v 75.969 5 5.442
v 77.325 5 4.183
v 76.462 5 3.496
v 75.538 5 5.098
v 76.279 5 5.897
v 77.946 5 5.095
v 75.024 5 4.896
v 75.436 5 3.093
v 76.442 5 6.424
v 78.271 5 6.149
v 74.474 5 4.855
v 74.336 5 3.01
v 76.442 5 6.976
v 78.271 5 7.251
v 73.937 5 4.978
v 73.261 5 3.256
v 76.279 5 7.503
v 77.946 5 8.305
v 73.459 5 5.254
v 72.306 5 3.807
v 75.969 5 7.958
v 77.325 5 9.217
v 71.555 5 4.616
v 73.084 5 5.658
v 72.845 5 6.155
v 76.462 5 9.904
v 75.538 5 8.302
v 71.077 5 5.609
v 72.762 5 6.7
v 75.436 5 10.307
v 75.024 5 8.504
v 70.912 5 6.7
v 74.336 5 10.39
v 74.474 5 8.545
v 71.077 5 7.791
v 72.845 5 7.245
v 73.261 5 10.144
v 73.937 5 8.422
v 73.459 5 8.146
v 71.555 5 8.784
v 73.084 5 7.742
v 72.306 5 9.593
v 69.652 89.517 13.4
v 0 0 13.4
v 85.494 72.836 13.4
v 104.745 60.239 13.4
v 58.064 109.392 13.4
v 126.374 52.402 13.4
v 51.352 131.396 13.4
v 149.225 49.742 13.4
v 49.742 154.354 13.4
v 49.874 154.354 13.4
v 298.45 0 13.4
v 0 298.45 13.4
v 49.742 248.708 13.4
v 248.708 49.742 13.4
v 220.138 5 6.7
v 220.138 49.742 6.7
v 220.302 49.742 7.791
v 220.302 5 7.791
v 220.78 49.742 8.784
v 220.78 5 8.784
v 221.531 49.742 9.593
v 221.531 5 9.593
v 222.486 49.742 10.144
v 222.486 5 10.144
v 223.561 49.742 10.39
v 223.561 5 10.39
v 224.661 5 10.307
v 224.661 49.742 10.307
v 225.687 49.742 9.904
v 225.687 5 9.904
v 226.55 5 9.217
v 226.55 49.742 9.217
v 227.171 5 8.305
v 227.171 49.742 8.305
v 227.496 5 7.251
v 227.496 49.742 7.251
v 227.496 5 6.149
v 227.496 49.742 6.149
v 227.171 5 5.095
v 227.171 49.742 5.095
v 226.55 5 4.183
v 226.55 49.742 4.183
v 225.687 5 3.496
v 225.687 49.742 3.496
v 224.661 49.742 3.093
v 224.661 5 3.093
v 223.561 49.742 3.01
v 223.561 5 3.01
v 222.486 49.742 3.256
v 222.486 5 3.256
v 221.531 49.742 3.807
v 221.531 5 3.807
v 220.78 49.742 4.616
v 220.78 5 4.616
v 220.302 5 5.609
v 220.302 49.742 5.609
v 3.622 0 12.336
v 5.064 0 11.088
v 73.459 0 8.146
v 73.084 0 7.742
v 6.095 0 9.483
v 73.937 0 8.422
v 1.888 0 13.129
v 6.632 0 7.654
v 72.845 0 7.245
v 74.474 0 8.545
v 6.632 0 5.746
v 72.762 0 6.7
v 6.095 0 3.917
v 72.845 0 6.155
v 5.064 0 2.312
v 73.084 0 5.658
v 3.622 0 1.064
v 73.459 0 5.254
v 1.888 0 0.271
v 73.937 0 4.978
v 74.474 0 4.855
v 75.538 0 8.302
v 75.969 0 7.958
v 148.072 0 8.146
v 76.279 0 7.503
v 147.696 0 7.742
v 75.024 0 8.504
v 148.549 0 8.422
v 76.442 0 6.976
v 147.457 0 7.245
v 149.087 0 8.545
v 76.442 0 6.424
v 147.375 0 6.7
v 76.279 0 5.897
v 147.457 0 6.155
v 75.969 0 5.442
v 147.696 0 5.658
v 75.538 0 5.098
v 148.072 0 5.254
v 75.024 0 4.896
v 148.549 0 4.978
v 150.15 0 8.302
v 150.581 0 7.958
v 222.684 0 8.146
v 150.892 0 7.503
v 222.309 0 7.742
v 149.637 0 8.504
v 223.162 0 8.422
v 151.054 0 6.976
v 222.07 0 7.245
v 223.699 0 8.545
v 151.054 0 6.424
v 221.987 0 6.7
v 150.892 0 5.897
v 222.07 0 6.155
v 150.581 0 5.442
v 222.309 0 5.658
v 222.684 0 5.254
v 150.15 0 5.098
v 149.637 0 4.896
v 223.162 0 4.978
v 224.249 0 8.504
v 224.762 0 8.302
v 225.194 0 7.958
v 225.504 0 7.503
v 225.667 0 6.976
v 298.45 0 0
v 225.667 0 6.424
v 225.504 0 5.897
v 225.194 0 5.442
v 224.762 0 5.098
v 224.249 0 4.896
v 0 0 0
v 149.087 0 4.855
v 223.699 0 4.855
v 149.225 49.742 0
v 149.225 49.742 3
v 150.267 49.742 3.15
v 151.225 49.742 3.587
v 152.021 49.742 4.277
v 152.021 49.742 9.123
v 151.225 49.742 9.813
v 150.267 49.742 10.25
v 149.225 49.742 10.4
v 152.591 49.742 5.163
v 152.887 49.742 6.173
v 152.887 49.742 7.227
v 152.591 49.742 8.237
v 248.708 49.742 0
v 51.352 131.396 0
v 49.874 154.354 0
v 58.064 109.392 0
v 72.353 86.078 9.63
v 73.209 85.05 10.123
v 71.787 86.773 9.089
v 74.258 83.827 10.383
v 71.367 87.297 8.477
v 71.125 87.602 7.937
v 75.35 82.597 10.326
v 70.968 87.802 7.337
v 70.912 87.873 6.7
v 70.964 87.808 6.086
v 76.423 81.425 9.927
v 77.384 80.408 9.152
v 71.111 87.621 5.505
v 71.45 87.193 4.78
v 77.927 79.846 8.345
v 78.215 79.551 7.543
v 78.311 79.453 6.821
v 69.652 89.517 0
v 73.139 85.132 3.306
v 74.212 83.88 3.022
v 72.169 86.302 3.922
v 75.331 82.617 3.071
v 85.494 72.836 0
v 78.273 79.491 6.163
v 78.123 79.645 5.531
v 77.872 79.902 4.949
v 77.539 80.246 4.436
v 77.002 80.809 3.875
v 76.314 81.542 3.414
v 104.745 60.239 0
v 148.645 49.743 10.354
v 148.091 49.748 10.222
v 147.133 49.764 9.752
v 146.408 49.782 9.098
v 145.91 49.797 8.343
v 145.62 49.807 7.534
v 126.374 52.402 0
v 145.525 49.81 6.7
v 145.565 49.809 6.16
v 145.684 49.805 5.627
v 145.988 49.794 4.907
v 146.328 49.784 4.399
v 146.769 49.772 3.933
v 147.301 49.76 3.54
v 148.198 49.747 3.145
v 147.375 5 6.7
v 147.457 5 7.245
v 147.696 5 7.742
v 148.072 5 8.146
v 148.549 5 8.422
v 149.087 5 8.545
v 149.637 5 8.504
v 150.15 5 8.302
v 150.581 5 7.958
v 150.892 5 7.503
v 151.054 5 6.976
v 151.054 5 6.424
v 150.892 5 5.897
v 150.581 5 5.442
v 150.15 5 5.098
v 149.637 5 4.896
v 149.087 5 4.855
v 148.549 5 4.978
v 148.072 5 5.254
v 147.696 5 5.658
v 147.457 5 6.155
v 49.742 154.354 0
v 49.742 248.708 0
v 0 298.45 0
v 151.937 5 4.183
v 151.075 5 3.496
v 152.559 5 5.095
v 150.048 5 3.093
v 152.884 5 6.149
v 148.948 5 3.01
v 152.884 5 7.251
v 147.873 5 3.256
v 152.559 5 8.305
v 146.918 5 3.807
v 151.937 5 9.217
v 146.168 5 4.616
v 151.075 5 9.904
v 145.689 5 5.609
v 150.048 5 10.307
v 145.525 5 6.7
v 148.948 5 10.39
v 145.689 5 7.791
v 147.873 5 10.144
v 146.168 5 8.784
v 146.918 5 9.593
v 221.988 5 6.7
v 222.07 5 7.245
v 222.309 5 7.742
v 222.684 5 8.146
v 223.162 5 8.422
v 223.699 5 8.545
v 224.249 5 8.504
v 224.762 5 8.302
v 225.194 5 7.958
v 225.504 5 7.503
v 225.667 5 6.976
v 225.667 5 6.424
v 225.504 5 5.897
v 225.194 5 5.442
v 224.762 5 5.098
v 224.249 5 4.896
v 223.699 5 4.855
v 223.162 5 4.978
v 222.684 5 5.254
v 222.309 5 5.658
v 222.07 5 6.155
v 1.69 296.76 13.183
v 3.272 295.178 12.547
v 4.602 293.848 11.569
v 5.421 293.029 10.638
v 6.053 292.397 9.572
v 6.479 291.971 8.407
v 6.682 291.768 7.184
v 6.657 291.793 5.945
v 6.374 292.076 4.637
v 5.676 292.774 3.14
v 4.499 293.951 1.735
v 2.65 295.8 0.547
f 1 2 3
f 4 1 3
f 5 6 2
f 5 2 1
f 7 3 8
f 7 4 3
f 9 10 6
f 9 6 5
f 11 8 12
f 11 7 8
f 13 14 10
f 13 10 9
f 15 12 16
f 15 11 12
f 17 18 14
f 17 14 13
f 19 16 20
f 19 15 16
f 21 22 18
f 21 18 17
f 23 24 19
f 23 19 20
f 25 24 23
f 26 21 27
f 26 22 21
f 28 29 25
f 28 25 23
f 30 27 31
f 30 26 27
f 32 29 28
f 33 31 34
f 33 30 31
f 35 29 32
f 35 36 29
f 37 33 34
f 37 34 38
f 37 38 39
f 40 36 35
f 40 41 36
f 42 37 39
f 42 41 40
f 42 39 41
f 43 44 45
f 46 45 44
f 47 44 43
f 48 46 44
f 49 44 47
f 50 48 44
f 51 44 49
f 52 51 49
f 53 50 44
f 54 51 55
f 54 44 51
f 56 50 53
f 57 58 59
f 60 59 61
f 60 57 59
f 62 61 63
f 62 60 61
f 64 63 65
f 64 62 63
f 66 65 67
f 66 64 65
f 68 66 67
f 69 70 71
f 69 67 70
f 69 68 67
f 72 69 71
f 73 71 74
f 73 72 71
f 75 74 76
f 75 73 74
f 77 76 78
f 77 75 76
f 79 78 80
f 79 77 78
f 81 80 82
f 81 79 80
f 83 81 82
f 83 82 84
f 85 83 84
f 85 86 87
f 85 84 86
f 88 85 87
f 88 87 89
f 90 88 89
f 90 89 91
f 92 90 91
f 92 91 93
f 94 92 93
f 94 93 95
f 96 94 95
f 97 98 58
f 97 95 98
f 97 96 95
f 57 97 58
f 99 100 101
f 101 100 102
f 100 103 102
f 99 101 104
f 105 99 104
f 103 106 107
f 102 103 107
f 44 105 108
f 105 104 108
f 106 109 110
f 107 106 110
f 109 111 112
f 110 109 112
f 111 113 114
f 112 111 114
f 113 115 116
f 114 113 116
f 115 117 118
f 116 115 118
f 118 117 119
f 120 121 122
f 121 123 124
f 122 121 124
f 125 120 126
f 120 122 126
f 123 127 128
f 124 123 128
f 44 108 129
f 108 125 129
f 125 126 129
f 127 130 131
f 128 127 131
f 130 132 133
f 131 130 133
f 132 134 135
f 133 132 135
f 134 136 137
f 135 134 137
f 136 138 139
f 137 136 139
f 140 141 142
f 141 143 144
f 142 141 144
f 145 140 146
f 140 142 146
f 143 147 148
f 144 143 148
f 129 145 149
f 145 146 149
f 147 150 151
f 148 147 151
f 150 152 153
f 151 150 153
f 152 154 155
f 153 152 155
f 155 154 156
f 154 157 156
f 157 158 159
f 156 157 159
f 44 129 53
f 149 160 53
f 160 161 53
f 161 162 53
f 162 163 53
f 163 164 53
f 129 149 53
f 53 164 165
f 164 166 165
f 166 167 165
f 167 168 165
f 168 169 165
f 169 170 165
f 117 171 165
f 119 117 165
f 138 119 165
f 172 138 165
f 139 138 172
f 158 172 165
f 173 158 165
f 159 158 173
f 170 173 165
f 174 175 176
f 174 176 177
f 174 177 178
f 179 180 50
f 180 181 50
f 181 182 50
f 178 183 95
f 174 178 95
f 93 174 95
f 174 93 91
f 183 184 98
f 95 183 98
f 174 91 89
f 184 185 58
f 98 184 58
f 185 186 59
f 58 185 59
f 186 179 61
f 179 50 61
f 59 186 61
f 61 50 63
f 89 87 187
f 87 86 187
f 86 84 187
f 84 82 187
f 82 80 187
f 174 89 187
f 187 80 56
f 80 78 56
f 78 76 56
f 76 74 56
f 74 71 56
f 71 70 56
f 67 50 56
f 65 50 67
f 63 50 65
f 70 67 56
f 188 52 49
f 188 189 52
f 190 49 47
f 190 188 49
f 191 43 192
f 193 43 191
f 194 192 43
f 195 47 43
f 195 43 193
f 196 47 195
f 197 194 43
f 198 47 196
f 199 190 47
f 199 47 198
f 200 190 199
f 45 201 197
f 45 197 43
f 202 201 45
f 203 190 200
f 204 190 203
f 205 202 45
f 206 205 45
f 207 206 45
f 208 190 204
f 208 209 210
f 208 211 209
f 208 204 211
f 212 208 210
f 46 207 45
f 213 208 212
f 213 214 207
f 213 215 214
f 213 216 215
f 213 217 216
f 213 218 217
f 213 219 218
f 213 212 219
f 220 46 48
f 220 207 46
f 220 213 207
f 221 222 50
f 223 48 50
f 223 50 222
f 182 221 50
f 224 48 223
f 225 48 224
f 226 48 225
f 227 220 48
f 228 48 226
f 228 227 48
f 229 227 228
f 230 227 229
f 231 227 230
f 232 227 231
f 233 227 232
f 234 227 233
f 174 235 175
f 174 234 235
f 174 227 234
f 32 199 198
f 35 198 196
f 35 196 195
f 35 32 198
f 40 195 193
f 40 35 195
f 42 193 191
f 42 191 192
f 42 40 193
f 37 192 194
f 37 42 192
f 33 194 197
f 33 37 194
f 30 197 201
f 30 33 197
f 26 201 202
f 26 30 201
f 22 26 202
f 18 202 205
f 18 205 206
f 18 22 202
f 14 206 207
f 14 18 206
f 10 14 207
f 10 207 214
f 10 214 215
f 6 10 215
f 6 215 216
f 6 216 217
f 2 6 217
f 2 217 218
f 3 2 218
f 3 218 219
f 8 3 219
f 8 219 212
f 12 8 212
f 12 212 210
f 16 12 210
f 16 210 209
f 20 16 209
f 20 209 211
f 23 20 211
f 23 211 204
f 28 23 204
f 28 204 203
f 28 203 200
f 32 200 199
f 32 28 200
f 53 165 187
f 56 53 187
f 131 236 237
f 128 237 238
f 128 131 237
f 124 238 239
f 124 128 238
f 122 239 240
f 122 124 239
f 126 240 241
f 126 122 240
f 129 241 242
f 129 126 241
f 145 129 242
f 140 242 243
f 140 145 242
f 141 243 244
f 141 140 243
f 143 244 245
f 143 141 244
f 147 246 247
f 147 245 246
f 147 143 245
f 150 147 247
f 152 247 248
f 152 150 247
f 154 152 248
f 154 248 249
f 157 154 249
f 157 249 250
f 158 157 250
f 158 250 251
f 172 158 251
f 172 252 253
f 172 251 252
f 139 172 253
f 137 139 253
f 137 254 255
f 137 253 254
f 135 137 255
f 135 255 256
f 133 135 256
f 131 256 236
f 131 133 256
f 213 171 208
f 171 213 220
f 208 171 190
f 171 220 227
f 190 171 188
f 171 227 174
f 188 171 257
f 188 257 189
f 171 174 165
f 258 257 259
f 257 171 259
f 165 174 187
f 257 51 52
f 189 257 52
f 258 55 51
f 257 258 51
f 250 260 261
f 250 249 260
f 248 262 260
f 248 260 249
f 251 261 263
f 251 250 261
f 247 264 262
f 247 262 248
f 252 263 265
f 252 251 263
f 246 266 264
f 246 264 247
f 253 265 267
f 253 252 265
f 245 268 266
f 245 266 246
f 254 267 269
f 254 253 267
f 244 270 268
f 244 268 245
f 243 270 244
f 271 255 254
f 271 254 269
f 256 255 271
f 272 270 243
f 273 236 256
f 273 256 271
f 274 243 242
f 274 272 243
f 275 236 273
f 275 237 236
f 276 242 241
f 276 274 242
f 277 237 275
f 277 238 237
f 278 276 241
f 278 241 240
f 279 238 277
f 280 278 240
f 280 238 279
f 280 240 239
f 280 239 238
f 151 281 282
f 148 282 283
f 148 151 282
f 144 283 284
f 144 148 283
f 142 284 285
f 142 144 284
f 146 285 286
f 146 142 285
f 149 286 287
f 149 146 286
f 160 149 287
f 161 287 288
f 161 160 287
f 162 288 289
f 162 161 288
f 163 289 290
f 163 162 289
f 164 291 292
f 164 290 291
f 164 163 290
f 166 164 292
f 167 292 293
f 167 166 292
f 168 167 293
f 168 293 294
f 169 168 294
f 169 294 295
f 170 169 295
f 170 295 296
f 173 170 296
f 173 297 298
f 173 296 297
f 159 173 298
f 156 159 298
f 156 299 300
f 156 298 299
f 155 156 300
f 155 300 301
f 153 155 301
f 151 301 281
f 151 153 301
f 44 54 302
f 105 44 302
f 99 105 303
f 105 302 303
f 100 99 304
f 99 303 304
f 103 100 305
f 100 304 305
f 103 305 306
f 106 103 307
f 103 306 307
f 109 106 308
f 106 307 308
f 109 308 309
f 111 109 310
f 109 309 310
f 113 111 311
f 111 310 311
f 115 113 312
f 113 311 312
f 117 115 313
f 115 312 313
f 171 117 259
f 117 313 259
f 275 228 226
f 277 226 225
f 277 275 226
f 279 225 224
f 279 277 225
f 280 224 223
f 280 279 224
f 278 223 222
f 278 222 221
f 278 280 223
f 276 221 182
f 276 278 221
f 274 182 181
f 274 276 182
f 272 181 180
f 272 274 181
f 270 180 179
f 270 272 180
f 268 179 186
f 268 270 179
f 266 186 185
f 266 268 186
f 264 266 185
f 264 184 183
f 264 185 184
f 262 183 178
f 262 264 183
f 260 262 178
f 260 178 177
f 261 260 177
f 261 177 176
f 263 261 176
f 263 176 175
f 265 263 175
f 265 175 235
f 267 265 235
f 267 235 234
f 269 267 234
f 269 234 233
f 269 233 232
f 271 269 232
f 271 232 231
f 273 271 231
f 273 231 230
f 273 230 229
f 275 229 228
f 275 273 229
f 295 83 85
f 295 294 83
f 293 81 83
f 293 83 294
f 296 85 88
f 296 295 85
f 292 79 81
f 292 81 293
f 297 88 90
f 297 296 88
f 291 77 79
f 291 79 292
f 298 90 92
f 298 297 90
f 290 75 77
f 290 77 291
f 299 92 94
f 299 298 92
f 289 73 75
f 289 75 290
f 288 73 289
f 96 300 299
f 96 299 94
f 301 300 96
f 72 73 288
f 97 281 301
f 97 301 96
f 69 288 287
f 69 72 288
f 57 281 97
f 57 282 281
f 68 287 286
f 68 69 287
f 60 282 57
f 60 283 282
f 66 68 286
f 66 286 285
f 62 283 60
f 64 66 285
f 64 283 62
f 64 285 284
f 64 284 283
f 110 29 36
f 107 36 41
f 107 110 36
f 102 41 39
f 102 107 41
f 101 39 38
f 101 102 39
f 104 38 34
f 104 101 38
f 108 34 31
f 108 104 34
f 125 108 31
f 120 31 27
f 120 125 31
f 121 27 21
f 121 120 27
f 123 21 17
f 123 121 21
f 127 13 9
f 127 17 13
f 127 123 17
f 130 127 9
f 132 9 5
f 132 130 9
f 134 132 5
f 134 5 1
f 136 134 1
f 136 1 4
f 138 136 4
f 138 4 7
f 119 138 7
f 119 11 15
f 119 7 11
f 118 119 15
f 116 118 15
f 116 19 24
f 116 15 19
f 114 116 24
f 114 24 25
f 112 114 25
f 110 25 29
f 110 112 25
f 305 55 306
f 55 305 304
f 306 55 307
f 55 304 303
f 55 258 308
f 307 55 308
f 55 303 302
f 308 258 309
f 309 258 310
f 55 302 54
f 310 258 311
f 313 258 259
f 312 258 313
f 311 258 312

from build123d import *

# Parameters (mm, degrees)
PAD_DEPTH              = 13.4
CYLINDER_W             = 6.7
CYLINDER_H             = 298.45
CYLINDER_ANGLE         = 180
CYLINDER001_R          = 99.483333
CYLINDER001_DEPTH      = 32
BOX_W                  = 149.225
BOX_H                  = 30
BOX_DEPTH              = 21
BOX001_W               = 33
BOX001_H               = 149.225
BOX001_DEPTH           = 22
CYLINDER002_R          = 3.7
CYLINDER002_DEPTH      = 105
LINEARPATTERN_COUNT    = 3
LINEARPATTERN_PITCH    = 74.6125
CYLINDER003_R          = 1.85
CYLINDER003_DEPTH      = 100
LINEARPATTERN001_COUNT = 3
LINEARPATTERN001_PITCH = 74.6125


with BuildPart() as part:
    # Sketch → Pad (new body)
    with BuildSketch(Plane.XY):
        Polygon((0, 0), (298.45, 0), (0, 298.45), align=None)
    extrude(amount=PAD_DEPTH)

    # Cylinder → Cylinder (revolve, cut)
    with BuildSketch(Plane(origin=(0, 0, 6.7), x_dir=(0, 0, 1), z_dir=(-1, 0, 0))):
        with Locations((3.35, 149.225)):
            Rectangle(CYLINDER_W, CYLINDER_H)
    revolve(axis=Axis((0, 0, 6.7), (0, 1, 0)), revolution_arc=CYLINDER_ANGLE, mode=Mode.SUBTRACT)

    # Cylinder001 → Cylinder001 (cut)
    with BuildSketch(Plane(origin=(149.225, 149.225, -8), x_dir=(1, 0, 0), z_dir=(0, 0, 1))):
        Circle(CYLINDER001_R)
    extrude(amount=CYLINDER001_DEPTH, mode=Mode.SUBTRACT)

    # Box → Box (cut)
    with BuildSketch(Plane(origin=(149.225, 79.741667, 17), x_dir=(1, 0, 0), z_dir=(0, 0, -1))):
        with Locations((74.6125, 15)):
            Rectangle(BOX_W, BOX_H)
    extrude(amount=BOX_DEPTH, mode=Mode.SUBTRACT)

    # Box001 → Box001 (cut)
    with BuildSketch(Plane(origin=(49.741667, 303.579167, 17), x_dir=(1, 0, 0), z_dir=(0, 0, -1))):
        with Locations((16.5, 74.6125)):
            Rectangle(BOX001_W, BOX001_H)
    extrude(amount=BOX001_DEPTH, mode=Mode.SUBTRACT)

    # Cylinder002 → Cylinder002 (cut)
    with BuildSketch(Plane(origin=(74.6125, 5, 6.7), x_dir=(-1, 0, 0), z_dir=(0, 1, 0))):
        Circle(CYLINDER002_R)
    cylinder002 = extrude(amount=CYLINDER002_DEPTH, mode=Mode.SUBTRACT)

    # LinearPattern: Cylinder002 ×3
    with Locations(*[(i * LINEARPATTERN_PITCH, 0, 0) for i in range(1, LINEARPATTERN_COUNT)]):
        add(cylinder002, mode=Mode.SUBTRACT)

    # Cylinder003 → Cylinder003 (cut)
    with BuildSketch(Plane(origin=(74.6125, 0, 6.7), x_dir=(-1, 0, 0), z_dir=(0, 1, 0))):
        Circle(CYLINDER003_R)
    cylinder003 = extrude(amount=CYLINDER003_DEPTH, mode=Mode.SUBTRACT)

    # LinearPattern001: Cylinder003 ×3
    with Locations(*[(i * LINEARPATTERN001_PITCH, 0, 0) for i in range(1, LINEARPATTERN001_COUNT)]):
        add(cylinder003, mode=Mode.SUBTRACT)


solid = part.part
